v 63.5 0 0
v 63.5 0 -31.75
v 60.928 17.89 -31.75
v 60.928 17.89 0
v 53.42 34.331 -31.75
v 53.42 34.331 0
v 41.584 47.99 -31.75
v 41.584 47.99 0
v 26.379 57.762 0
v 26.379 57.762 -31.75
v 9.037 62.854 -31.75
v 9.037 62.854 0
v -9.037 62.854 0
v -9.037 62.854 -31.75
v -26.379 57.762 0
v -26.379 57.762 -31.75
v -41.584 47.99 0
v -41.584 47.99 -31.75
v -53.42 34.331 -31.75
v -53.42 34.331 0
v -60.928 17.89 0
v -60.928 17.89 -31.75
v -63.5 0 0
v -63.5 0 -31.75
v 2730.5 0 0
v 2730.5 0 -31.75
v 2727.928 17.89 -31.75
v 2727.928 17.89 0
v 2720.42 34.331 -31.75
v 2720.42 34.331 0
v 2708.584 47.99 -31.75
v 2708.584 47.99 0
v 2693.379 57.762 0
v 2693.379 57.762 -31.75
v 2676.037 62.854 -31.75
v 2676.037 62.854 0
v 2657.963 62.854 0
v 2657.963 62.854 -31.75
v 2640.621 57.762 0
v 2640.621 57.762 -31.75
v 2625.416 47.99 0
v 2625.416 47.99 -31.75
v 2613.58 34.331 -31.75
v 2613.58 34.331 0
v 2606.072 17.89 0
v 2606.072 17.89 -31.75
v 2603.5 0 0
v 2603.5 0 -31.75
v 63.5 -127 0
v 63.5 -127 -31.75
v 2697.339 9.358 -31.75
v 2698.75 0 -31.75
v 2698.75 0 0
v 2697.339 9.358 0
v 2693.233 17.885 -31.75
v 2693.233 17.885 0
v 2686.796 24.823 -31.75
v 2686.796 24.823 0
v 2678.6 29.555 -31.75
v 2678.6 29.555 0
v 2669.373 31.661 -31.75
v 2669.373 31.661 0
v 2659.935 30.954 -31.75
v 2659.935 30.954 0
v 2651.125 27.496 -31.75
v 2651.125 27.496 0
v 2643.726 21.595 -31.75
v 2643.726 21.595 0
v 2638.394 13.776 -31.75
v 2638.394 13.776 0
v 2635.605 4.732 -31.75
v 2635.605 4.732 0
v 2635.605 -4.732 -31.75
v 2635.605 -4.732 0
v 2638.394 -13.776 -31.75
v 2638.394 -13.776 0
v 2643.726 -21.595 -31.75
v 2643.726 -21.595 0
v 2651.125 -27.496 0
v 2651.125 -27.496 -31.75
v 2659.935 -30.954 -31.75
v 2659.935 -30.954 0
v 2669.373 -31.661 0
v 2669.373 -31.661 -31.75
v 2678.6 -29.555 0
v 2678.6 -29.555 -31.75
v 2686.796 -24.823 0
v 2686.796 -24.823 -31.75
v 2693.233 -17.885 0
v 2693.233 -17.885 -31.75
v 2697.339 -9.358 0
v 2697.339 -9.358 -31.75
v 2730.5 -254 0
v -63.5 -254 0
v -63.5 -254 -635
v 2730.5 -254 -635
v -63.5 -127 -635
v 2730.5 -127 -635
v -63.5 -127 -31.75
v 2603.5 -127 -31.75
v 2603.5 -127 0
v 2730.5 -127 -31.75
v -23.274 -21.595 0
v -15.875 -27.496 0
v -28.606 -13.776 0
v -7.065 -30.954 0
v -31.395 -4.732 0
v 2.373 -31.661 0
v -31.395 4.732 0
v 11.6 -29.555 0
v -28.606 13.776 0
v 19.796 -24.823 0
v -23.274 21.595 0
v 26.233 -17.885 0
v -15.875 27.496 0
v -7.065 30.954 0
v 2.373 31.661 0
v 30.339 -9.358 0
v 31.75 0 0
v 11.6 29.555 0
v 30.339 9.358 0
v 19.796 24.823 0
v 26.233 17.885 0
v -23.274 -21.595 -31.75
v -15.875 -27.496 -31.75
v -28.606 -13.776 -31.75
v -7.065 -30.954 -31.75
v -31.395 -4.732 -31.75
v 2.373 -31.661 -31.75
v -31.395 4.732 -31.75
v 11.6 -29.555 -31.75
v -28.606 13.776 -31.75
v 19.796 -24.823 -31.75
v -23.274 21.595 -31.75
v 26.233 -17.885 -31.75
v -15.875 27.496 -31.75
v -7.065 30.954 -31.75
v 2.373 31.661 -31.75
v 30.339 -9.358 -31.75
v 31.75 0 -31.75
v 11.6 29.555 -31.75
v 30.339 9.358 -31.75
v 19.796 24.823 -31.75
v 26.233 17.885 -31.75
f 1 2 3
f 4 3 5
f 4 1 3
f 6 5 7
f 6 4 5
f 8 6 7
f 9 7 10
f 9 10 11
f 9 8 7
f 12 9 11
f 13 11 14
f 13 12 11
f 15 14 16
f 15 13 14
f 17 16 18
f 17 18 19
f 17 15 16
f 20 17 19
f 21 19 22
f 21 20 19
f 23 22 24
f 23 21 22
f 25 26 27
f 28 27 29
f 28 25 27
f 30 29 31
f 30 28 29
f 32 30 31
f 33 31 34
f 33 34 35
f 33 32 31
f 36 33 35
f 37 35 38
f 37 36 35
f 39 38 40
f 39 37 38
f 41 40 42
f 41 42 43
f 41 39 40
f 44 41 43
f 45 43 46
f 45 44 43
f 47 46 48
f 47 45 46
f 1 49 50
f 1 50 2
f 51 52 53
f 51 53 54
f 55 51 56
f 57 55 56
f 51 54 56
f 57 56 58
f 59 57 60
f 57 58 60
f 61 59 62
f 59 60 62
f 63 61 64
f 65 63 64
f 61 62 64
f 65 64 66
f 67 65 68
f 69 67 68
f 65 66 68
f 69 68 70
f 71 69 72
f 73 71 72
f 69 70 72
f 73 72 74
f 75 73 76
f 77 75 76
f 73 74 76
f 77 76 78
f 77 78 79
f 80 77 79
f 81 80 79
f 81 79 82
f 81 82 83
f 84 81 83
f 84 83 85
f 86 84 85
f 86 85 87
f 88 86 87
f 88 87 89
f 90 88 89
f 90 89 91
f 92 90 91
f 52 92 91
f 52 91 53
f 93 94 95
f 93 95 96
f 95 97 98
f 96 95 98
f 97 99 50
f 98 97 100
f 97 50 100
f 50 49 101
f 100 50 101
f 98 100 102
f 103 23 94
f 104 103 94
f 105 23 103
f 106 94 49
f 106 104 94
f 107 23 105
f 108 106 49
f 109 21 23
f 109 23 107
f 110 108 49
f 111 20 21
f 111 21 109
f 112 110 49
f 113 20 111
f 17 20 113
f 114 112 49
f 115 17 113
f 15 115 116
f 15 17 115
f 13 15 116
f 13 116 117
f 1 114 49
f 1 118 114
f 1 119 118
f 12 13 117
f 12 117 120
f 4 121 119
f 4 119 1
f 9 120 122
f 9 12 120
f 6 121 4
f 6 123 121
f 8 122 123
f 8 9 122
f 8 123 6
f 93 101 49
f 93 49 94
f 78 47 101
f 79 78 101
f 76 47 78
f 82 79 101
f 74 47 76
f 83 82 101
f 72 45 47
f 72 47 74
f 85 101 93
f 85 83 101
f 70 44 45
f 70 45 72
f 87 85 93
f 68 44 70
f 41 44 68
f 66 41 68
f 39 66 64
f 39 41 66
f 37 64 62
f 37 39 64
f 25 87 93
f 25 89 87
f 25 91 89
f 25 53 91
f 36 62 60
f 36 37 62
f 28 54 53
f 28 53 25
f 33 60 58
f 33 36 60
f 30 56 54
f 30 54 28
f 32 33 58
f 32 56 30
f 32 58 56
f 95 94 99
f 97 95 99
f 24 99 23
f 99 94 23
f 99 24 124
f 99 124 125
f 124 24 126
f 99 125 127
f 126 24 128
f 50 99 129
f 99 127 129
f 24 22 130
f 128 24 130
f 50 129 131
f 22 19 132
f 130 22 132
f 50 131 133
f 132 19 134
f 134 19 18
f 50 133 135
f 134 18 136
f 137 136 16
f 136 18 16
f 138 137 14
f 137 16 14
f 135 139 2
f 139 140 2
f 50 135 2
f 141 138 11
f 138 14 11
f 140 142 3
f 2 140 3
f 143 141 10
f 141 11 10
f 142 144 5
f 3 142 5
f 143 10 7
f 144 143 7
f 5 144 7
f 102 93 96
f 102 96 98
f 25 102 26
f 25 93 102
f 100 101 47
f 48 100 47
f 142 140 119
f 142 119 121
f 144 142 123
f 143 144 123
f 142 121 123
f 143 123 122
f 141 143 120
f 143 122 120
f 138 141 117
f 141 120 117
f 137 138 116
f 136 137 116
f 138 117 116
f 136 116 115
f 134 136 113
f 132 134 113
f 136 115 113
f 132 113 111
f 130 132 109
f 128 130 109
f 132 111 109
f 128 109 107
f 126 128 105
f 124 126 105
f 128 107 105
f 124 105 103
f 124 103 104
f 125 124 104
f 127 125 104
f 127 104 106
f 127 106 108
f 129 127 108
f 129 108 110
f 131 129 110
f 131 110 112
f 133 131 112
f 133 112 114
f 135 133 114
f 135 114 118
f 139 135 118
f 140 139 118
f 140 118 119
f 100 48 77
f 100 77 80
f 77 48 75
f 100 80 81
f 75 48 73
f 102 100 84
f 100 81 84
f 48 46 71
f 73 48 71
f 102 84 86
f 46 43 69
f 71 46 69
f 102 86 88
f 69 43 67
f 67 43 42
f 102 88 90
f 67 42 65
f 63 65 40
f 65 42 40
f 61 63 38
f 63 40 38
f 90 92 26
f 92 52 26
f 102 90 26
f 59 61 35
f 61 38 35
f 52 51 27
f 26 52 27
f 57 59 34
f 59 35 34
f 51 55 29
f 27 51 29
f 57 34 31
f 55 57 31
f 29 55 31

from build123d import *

# Parameters (mm, degrees)
SKETCH1_R           = 63.5
SKETCH1_W           = 127
SKETCH1_H           = 127
BOSS_EXTRUDE1_DEPTH = 31.75
SKETCH2_W           = 2794
SKETCH2_H           = 127
BOSS_EXTRUDE2_DEPTH = 635
SKETCH3_R           = 31.75
CUT_EXTRUDE1_DEPTH  = 2815.848352931


with BuildPart() as part:
    # Sketch1 → Boss-Extrude1 (new body)
    with BuildSketch(Plane.XY):
        Circle(SKETCH1_R)
        with Locations((2667, 0)):
            Circle(SKETCH1_R)
        with Locations((0, -63.5)):
            Rectangle(SKETCH1_W, SKETCH1_H)
        with Locations((2667, -63.5)):
            Rectangle(SKETCH1_W, SKETCH1_H)
    extrude(amount=-BOSS_EXTRUDE1_DEPTH)

    # Sketch2 → Boss-Extrude2 (add)
    with BuildSketch(Plane.XY):
        with Locations((1333.5, -190.5)):
            Rectangle(SKETCH2_W, SKETCH2_H)
    extrude(amount=-BOSS_EXTRUDE2_DEPTH)

    # Sketch3 → Cut-Extrude1 (cut, through all)
    with BuildSketch(Plane.XY):
        Circle(SKETCH3_R)
        with Locations((2667, 0)):
            Circle(SKETCH3_R)
    extrude(amount=-CUT_EXTRUDE1_DEPTH, mode=Mode.SUBTRACT)


solid = part.part
